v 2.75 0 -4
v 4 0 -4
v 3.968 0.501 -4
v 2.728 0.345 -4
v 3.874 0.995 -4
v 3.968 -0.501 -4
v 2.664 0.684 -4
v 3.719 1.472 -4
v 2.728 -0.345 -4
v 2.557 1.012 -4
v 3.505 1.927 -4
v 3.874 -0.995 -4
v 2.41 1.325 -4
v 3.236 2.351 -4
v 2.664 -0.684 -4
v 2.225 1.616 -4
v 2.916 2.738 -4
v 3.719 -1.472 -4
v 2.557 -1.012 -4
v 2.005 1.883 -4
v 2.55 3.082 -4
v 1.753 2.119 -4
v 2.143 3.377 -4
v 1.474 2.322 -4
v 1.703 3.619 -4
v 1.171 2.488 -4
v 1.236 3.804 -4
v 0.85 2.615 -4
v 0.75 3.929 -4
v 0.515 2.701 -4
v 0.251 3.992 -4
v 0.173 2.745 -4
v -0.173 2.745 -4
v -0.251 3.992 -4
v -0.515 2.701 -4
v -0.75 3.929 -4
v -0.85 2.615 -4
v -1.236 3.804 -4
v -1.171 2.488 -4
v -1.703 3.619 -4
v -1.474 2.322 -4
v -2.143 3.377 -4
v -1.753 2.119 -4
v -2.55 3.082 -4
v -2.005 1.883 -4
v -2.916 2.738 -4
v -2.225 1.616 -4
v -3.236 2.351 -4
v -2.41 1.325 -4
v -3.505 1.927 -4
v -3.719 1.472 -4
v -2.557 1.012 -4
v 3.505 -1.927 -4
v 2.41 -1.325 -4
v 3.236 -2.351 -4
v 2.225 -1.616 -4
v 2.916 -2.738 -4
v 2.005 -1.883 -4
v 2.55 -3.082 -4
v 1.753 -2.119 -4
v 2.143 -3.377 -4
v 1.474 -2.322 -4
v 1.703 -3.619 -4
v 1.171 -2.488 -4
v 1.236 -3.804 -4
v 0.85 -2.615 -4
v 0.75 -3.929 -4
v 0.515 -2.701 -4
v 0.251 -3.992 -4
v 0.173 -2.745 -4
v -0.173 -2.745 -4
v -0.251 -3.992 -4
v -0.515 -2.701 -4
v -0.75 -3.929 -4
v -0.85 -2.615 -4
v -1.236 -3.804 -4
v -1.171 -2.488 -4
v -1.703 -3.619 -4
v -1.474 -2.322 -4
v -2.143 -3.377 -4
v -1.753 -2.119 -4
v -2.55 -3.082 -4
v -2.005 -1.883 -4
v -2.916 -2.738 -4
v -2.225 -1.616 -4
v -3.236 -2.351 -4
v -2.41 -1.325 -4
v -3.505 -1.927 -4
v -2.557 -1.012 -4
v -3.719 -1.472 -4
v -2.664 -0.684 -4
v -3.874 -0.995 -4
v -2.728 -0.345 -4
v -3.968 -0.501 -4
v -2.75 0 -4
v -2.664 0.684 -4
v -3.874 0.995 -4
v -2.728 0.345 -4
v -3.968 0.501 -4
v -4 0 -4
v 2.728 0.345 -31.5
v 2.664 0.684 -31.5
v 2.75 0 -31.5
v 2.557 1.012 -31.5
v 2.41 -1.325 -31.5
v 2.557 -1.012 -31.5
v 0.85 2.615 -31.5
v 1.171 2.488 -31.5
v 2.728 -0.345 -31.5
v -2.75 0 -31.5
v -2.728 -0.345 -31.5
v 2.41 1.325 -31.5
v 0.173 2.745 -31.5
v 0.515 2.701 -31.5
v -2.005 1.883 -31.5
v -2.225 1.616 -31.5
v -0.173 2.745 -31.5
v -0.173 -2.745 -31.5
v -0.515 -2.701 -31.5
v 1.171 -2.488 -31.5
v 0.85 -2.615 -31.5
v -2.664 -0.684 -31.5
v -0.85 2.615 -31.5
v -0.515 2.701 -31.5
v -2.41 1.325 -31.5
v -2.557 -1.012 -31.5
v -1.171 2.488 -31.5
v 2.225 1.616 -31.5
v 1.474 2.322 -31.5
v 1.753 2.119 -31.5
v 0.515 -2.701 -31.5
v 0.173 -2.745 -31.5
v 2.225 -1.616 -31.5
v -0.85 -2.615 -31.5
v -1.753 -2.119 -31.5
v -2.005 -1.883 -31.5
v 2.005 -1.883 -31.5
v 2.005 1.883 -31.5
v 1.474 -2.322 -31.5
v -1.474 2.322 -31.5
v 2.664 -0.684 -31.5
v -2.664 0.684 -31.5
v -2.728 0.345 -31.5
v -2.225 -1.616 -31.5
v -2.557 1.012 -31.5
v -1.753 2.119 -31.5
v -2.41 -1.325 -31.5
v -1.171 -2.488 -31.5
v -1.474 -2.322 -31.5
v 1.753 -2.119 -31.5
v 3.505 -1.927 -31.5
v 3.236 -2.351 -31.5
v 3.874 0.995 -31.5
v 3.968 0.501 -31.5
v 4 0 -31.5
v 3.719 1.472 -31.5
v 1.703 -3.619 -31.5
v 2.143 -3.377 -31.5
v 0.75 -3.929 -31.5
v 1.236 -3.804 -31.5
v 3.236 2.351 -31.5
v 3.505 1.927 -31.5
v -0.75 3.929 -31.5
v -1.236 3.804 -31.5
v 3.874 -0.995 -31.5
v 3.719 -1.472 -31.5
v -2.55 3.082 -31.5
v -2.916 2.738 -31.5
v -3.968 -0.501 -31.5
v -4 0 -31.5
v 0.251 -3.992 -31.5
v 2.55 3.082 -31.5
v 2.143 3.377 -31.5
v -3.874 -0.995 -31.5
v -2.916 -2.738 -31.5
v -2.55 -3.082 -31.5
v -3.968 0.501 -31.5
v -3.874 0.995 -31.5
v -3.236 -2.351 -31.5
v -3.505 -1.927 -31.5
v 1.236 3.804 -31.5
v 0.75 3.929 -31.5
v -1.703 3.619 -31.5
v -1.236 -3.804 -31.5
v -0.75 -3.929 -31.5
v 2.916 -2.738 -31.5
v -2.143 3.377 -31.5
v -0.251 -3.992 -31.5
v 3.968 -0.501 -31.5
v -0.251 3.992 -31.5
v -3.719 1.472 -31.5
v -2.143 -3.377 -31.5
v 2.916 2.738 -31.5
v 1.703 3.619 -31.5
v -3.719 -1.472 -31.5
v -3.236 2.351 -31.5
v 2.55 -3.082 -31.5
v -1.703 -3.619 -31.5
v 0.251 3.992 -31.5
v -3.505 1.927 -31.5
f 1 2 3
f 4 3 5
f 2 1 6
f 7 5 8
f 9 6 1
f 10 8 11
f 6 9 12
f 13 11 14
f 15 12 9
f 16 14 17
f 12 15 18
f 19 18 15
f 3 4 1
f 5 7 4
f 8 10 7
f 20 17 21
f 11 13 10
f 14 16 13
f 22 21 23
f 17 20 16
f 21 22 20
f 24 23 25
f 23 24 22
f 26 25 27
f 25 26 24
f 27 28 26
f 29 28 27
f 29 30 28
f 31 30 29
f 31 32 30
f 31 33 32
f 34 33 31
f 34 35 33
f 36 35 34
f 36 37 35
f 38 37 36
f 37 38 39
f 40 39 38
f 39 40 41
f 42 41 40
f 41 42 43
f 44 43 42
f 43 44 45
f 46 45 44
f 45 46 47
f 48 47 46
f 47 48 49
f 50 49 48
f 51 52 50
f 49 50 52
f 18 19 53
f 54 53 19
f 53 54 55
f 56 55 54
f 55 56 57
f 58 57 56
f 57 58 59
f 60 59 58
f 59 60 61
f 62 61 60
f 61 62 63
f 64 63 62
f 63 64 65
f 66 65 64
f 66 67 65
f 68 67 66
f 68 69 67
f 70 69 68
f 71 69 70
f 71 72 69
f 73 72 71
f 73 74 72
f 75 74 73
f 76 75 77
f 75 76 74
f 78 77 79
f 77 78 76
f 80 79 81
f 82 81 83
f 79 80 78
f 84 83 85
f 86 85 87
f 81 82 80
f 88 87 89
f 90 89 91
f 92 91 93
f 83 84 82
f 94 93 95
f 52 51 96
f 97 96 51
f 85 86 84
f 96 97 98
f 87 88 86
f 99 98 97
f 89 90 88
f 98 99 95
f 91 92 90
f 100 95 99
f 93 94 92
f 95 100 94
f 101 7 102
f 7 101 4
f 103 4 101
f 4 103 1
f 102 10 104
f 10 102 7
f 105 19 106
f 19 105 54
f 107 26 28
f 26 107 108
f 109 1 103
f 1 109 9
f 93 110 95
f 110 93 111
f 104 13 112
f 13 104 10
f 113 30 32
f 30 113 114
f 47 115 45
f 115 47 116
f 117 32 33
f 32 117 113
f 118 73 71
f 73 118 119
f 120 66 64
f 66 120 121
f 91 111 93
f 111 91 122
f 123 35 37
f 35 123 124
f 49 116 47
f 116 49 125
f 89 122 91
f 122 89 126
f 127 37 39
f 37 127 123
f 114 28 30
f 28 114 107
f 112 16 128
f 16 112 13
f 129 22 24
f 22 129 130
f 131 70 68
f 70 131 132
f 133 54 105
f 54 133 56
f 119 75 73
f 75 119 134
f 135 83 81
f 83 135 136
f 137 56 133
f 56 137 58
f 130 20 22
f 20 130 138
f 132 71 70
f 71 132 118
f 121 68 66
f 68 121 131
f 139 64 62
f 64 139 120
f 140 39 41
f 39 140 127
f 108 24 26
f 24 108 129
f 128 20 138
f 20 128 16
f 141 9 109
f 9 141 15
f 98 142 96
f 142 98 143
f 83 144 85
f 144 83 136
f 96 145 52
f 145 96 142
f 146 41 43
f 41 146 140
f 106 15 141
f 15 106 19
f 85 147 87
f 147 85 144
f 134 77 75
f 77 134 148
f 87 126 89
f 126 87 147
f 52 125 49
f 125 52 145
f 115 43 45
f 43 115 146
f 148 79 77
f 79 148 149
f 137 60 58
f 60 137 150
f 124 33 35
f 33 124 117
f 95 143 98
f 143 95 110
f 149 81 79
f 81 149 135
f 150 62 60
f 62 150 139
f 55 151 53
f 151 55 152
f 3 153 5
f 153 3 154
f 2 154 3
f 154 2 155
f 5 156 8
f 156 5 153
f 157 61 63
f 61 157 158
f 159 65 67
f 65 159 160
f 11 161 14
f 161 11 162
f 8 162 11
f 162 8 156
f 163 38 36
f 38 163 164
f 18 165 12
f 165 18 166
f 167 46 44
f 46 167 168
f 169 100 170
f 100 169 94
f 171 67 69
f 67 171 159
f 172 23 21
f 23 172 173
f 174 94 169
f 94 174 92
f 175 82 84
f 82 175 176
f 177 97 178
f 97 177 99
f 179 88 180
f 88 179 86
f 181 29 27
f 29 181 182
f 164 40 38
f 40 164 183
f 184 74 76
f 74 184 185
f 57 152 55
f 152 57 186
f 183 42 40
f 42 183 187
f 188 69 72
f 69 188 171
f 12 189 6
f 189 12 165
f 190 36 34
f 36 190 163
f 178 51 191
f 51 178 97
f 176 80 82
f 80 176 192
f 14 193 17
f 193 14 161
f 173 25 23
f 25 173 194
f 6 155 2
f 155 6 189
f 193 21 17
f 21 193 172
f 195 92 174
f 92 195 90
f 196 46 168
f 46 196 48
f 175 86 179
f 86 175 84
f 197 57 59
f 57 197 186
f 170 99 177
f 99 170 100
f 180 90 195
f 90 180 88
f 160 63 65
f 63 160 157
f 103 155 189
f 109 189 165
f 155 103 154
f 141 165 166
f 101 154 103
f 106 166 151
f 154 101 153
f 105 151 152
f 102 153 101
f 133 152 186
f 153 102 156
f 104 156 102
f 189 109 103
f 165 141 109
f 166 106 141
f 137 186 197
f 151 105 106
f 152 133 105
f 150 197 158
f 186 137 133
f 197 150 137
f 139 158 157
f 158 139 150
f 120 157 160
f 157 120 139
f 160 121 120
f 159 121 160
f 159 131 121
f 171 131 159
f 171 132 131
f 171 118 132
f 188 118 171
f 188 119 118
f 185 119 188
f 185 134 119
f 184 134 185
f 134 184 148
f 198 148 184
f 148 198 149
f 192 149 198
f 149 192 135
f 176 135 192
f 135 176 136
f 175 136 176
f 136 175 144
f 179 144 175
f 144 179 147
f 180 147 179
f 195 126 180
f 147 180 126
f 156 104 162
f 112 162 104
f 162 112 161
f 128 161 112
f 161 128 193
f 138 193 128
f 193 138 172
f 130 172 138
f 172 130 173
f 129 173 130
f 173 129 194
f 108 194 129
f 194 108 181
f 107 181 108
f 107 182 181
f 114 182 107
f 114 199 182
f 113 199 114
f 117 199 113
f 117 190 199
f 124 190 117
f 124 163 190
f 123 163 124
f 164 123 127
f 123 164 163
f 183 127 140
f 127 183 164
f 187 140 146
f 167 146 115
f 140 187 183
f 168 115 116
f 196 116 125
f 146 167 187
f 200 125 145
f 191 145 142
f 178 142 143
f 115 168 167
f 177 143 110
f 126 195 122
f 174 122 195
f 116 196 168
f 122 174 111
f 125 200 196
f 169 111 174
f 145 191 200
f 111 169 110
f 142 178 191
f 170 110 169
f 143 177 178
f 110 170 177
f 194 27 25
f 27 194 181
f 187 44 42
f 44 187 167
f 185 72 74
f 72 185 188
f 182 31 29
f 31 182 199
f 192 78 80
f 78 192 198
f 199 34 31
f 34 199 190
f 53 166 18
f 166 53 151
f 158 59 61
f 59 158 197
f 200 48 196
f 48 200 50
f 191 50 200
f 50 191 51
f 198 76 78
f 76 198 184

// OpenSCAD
$fn = 50;

difference() {
	union() {
		translate(v = [0, 0, -31.5]) {
			cylinder(h = 31.5, r = 4.0);
		}
	}
	union() {
		translate(v = [0, 0, 0]) {
			rotate(a = [0, 0, 0]) {
				difference() {
					union() {
						translate(v = [0, 0, -4]) {
							linear_extrude(height = 4) {
								polygon(points = [[4.8468, 0.0], [2.4234000000000004, 4.197451927062417], [-2.423399999999999, 4.197451927062417], [-4.8468, 5.935618106107392e-16], [-2.423400000000002, -4.197451927062416], [2.423399999999997, -4.197451927062419]]);
							}
						}
					}
					union();
				}
			}
		}
		#translate(v = [0, 0, -100.0]) {
			cylinder(h = 200, r = 2.75);
		}
	}
}
